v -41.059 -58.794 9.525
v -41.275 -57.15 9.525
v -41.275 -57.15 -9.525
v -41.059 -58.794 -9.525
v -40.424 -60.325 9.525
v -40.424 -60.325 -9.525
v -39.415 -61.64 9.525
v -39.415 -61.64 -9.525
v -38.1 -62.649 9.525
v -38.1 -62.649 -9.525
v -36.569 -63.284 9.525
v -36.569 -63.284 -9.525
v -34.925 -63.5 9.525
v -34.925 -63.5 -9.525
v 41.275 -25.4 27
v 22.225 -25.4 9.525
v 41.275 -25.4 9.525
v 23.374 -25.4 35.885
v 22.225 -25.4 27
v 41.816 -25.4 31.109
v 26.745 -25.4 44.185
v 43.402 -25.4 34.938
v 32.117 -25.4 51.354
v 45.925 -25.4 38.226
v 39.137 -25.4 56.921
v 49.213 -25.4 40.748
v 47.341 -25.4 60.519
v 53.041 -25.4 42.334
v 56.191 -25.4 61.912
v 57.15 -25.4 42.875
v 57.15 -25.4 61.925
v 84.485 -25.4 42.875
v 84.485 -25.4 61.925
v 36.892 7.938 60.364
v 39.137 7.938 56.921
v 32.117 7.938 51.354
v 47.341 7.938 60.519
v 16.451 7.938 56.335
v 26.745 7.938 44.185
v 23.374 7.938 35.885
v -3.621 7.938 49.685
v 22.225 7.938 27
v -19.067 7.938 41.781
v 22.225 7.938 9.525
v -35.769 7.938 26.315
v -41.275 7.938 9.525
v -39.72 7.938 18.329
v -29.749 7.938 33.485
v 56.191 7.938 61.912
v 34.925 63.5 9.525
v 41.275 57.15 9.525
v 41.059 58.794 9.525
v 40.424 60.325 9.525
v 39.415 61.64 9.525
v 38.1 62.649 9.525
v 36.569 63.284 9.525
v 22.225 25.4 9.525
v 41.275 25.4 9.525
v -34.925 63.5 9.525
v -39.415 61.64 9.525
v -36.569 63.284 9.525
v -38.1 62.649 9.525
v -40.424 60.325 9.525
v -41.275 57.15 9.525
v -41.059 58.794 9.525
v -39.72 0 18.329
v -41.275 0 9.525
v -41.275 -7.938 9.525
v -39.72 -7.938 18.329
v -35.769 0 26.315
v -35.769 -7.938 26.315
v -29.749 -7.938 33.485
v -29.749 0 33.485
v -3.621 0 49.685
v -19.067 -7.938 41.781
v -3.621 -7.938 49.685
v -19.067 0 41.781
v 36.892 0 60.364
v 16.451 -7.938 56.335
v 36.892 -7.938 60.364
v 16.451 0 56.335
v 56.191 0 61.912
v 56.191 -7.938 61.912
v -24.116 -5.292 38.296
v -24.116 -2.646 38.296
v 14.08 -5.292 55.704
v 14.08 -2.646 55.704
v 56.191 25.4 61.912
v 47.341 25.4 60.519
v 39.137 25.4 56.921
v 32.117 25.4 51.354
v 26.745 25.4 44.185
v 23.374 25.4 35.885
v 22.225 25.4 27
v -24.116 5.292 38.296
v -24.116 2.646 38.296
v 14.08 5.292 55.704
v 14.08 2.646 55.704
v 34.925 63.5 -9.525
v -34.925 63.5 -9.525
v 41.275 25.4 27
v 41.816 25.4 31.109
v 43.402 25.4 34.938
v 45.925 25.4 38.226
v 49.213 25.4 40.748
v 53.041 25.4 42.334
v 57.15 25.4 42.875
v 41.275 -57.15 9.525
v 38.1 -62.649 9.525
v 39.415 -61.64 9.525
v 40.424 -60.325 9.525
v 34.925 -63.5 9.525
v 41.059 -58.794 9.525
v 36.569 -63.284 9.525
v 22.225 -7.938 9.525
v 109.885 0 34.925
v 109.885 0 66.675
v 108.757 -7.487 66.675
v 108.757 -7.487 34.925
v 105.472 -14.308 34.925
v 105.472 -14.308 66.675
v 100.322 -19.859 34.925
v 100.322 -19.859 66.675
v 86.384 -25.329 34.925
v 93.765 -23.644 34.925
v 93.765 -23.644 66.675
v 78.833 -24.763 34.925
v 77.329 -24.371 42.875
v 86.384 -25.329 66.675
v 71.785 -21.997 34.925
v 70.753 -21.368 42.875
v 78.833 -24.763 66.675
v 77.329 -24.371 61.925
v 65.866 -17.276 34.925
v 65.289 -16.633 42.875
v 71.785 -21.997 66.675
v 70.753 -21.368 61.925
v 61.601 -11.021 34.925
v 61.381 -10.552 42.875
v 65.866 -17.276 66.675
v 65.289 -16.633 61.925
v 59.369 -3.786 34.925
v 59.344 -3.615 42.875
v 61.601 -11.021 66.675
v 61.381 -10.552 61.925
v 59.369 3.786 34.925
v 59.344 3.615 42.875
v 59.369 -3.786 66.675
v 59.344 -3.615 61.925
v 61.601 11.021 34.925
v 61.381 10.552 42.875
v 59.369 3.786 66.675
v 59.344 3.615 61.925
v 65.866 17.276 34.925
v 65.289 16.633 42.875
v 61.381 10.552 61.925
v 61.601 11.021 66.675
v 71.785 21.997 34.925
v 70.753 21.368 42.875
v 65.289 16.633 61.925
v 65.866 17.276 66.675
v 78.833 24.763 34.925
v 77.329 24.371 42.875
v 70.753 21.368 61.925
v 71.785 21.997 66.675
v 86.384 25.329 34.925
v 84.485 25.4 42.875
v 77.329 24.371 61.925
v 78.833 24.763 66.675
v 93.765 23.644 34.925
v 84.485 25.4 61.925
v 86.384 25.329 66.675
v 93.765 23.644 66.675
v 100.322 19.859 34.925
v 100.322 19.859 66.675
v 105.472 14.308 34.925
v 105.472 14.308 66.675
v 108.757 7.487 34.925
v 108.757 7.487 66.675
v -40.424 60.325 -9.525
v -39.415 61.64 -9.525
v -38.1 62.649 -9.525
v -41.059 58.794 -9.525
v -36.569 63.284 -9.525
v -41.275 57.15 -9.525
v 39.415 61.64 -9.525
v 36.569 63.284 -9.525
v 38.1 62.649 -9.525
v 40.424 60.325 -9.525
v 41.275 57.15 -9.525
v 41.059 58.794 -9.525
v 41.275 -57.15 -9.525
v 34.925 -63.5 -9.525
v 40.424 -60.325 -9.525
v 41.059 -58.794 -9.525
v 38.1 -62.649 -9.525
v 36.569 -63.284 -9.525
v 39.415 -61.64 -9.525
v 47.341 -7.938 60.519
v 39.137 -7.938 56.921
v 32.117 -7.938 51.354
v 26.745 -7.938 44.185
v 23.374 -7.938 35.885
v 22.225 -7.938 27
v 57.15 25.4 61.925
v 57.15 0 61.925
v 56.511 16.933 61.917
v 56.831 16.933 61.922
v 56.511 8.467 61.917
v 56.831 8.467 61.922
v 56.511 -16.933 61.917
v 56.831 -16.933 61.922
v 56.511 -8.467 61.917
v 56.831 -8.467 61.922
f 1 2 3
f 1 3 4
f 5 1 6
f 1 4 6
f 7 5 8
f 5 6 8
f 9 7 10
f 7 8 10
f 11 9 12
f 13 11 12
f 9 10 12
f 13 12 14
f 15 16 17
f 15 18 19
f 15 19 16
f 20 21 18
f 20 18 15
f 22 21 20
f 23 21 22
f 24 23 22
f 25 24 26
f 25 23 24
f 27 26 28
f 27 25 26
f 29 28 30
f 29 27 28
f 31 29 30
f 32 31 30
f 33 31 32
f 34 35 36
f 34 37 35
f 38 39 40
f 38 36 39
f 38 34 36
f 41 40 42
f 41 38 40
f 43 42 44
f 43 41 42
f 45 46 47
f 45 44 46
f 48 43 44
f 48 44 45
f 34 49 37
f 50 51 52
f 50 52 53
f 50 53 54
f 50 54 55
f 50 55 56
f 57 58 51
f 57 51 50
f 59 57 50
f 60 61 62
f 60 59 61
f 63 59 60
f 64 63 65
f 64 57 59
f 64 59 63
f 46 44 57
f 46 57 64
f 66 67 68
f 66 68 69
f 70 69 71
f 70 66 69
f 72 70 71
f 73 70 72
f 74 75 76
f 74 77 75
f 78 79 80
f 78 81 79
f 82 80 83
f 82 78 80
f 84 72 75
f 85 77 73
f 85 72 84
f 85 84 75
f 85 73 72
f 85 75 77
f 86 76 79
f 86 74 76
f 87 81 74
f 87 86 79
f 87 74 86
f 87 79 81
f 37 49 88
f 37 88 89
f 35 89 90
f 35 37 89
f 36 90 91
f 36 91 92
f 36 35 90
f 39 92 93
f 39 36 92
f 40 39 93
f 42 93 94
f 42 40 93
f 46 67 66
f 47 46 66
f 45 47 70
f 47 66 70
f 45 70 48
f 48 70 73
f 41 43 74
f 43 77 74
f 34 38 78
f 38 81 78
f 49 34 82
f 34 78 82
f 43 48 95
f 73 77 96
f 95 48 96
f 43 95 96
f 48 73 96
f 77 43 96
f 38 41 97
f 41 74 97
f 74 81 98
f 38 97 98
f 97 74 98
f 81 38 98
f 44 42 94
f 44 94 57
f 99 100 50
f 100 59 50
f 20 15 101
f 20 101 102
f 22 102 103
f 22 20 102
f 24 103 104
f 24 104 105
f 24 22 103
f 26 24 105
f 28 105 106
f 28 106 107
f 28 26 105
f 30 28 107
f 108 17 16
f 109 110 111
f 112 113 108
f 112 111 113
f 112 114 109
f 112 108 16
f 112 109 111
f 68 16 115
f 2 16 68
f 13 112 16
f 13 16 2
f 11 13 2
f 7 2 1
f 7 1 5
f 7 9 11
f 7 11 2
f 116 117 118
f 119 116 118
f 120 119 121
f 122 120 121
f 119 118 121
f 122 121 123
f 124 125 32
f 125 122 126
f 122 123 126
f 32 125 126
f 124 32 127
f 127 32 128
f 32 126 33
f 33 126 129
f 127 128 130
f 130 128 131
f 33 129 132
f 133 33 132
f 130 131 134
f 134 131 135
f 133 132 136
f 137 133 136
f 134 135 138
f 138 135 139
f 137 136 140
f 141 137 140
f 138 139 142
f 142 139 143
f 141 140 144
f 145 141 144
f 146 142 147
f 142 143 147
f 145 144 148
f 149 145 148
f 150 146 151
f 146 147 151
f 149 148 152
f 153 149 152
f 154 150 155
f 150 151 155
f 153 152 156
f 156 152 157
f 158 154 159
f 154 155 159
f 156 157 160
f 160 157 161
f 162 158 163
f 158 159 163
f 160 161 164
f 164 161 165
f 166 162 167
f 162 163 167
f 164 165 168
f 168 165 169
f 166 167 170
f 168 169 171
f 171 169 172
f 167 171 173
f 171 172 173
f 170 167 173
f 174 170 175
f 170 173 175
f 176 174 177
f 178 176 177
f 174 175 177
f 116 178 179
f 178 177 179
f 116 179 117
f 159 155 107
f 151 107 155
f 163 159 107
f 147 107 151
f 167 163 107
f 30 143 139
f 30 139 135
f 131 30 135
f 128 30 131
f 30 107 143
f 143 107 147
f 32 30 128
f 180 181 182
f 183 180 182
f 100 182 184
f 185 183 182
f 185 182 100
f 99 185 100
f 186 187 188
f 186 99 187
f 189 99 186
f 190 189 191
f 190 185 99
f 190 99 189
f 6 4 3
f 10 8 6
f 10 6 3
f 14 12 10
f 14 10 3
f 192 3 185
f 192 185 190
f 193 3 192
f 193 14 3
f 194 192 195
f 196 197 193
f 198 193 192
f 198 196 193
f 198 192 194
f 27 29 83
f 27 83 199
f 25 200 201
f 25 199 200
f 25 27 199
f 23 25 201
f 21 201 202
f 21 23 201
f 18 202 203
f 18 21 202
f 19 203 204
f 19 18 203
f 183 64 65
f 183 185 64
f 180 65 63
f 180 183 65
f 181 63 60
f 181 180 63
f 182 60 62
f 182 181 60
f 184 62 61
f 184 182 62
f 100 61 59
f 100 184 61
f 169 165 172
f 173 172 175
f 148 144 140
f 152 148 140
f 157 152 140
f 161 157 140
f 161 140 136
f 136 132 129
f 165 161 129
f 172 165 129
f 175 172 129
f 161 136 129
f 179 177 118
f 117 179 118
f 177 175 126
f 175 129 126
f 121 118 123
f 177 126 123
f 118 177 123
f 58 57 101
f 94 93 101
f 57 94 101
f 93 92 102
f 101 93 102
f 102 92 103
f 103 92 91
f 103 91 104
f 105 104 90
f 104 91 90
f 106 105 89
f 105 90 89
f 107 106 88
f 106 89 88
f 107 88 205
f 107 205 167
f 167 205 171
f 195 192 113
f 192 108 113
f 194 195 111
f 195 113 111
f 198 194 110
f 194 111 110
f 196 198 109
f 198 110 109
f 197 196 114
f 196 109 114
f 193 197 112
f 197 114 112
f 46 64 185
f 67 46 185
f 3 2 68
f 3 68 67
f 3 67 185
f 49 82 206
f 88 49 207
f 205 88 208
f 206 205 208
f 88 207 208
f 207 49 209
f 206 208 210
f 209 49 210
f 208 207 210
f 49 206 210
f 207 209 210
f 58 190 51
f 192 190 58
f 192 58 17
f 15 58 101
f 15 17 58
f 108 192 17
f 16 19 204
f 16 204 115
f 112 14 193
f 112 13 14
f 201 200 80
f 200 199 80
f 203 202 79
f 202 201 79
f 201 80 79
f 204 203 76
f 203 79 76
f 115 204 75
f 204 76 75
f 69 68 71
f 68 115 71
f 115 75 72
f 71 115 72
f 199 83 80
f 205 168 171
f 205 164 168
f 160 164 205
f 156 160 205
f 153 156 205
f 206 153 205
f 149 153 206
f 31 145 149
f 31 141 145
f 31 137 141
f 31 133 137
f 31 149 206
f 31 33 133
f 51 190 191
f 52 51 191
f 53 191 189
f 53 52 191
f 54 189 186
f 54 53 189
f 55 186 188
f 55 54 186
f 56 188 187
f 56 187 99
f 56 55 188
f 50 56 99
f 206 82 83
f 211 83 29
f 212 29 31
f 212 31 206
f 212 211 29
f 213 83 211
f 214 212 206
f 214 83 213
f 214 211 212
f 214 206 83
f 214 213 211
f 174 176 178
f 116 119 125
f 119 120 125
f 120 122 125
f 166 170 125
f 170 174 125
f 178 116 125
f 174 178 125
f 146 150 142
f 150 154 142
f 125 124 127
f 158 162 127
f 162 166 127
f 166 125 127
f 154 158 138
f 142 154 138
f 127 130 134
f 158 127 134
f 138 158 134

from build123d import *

# Parameters (mm, degrees)
F1_DEPTH = 63.5
F2_DEPTH = 25.4
F3_DEPTH = 7.9375
F5_R     = 6.35


with BuildPart() as f1:
    # F0 (on Front) → F1 (new body, symmetric)
    with BuildSketch(Plane.XZ):
        Polygon((-41.275, -9.525), (41.275, -9.525), (41.275, 9.525), (22.225, 9.525), (-41.275, 9.525), align=None)
    extrude(amount=F1_DEPTH, both=True)

    # F0 (on Front) → F2 (join, symmetric)
    with BuildSketch(Plane.XZ):
        with BuildLine():
            Line((22.225, 9.525), (41.275, 9.525))
            Line((41.275, 9.525), (41.275, 27.0002))
            ThreePointArc((41.275, 27.0002), (45.9246798487, 38.2255201513), (57.15, 42.8752))
            Line((57.15, 42.8752), (59.0854373096, 42.8752))
            Line((59.0854373096, 42.8752), (59.0854373096, 61.9252))
            Line((59.0854373096, 61.9252), (57.15, 61.9252))
            add(Edge.make_bspline(
                [(56.190827001, 61.9120262507), (56.5119550405, 61.9175775521), (56.831694443, 61.9219686584), (57.15, 61.9252)],
                knots=[110.5788224072, 110.5788224072, 110.5788224072, 110.5788224072, 111.5045361635, 111.5045361635, 111.5045361635, 111.5045361635], degree=3))
            ThreePointArc((56.190827001, 61.9120262507), (32.1174737393, 51.3544245618), (22.225, 27.0002))
            Line((22.225, 27.0002), (22.225, 9.525))
        make_face()
        Polygon((59.0854373096, 61.9252), (59.0854373096, 42.8752), (84.4854373096, 42.8752), (84.4854373096, 50.8), (84.4854373096, 61.9252), align=None)
    extrude(amount=F2_DEPTH, both=True)

    # F0 (on Front) → F3 (join, symmetric)
    with BuildSketch(Plane.XZ):
        with BuildLine():
            add(Edge.make_bspline(
                [(-41.275, 9.525), (-40.342589198, 44.0310850968), (17.8312798934, 61.2489094196), (56.190827001, 61.9120262507)],
                knots=[0, 0, 0, 0, 110.5788224072, 110.5788224072, 110.5788224072, 110.5788224072], degree=3))
            Line((-41.275, 9.525), (22.225, 9.525))
            Line((22.225, 9.525), (22.225, 27.0002))
            ThreePointArc((22.225, 27.0002), (32.1174737393, 51.3544245618), (56.190827001, 61.9120262507))
        make_face()
    extrude(amount=F3_DEPTH, both=True)

    # F0 (on Front) → F4 (revolve)
    with BuildSketch(Plane.XZ):
        Polygon((84.4854373096, 50.8), (84.4854373096, 42.8752), (84.4854373096, 34.925), (109.8854373096, 34.925), (109.8854373096, 66.675), (84.4854373096, 66.675), (84.4854373096, 61.9252), align=None)
    revolve(axis=Axis((84.4854373096, 0, 42.8625), (0, 0, -1)))

    # F5
    f5_edges = [f1.edges().sort_by_distance(p)[0] for p in [
        (41.275, -63.5, 0),
        (-41.275, -63.5, 0),
        (41.275, 63.5, 0),
        (-41.275, 63.5, 0),
    ]]
    fillet(f5_edges, radius=F5_R)


solid = f1.part
